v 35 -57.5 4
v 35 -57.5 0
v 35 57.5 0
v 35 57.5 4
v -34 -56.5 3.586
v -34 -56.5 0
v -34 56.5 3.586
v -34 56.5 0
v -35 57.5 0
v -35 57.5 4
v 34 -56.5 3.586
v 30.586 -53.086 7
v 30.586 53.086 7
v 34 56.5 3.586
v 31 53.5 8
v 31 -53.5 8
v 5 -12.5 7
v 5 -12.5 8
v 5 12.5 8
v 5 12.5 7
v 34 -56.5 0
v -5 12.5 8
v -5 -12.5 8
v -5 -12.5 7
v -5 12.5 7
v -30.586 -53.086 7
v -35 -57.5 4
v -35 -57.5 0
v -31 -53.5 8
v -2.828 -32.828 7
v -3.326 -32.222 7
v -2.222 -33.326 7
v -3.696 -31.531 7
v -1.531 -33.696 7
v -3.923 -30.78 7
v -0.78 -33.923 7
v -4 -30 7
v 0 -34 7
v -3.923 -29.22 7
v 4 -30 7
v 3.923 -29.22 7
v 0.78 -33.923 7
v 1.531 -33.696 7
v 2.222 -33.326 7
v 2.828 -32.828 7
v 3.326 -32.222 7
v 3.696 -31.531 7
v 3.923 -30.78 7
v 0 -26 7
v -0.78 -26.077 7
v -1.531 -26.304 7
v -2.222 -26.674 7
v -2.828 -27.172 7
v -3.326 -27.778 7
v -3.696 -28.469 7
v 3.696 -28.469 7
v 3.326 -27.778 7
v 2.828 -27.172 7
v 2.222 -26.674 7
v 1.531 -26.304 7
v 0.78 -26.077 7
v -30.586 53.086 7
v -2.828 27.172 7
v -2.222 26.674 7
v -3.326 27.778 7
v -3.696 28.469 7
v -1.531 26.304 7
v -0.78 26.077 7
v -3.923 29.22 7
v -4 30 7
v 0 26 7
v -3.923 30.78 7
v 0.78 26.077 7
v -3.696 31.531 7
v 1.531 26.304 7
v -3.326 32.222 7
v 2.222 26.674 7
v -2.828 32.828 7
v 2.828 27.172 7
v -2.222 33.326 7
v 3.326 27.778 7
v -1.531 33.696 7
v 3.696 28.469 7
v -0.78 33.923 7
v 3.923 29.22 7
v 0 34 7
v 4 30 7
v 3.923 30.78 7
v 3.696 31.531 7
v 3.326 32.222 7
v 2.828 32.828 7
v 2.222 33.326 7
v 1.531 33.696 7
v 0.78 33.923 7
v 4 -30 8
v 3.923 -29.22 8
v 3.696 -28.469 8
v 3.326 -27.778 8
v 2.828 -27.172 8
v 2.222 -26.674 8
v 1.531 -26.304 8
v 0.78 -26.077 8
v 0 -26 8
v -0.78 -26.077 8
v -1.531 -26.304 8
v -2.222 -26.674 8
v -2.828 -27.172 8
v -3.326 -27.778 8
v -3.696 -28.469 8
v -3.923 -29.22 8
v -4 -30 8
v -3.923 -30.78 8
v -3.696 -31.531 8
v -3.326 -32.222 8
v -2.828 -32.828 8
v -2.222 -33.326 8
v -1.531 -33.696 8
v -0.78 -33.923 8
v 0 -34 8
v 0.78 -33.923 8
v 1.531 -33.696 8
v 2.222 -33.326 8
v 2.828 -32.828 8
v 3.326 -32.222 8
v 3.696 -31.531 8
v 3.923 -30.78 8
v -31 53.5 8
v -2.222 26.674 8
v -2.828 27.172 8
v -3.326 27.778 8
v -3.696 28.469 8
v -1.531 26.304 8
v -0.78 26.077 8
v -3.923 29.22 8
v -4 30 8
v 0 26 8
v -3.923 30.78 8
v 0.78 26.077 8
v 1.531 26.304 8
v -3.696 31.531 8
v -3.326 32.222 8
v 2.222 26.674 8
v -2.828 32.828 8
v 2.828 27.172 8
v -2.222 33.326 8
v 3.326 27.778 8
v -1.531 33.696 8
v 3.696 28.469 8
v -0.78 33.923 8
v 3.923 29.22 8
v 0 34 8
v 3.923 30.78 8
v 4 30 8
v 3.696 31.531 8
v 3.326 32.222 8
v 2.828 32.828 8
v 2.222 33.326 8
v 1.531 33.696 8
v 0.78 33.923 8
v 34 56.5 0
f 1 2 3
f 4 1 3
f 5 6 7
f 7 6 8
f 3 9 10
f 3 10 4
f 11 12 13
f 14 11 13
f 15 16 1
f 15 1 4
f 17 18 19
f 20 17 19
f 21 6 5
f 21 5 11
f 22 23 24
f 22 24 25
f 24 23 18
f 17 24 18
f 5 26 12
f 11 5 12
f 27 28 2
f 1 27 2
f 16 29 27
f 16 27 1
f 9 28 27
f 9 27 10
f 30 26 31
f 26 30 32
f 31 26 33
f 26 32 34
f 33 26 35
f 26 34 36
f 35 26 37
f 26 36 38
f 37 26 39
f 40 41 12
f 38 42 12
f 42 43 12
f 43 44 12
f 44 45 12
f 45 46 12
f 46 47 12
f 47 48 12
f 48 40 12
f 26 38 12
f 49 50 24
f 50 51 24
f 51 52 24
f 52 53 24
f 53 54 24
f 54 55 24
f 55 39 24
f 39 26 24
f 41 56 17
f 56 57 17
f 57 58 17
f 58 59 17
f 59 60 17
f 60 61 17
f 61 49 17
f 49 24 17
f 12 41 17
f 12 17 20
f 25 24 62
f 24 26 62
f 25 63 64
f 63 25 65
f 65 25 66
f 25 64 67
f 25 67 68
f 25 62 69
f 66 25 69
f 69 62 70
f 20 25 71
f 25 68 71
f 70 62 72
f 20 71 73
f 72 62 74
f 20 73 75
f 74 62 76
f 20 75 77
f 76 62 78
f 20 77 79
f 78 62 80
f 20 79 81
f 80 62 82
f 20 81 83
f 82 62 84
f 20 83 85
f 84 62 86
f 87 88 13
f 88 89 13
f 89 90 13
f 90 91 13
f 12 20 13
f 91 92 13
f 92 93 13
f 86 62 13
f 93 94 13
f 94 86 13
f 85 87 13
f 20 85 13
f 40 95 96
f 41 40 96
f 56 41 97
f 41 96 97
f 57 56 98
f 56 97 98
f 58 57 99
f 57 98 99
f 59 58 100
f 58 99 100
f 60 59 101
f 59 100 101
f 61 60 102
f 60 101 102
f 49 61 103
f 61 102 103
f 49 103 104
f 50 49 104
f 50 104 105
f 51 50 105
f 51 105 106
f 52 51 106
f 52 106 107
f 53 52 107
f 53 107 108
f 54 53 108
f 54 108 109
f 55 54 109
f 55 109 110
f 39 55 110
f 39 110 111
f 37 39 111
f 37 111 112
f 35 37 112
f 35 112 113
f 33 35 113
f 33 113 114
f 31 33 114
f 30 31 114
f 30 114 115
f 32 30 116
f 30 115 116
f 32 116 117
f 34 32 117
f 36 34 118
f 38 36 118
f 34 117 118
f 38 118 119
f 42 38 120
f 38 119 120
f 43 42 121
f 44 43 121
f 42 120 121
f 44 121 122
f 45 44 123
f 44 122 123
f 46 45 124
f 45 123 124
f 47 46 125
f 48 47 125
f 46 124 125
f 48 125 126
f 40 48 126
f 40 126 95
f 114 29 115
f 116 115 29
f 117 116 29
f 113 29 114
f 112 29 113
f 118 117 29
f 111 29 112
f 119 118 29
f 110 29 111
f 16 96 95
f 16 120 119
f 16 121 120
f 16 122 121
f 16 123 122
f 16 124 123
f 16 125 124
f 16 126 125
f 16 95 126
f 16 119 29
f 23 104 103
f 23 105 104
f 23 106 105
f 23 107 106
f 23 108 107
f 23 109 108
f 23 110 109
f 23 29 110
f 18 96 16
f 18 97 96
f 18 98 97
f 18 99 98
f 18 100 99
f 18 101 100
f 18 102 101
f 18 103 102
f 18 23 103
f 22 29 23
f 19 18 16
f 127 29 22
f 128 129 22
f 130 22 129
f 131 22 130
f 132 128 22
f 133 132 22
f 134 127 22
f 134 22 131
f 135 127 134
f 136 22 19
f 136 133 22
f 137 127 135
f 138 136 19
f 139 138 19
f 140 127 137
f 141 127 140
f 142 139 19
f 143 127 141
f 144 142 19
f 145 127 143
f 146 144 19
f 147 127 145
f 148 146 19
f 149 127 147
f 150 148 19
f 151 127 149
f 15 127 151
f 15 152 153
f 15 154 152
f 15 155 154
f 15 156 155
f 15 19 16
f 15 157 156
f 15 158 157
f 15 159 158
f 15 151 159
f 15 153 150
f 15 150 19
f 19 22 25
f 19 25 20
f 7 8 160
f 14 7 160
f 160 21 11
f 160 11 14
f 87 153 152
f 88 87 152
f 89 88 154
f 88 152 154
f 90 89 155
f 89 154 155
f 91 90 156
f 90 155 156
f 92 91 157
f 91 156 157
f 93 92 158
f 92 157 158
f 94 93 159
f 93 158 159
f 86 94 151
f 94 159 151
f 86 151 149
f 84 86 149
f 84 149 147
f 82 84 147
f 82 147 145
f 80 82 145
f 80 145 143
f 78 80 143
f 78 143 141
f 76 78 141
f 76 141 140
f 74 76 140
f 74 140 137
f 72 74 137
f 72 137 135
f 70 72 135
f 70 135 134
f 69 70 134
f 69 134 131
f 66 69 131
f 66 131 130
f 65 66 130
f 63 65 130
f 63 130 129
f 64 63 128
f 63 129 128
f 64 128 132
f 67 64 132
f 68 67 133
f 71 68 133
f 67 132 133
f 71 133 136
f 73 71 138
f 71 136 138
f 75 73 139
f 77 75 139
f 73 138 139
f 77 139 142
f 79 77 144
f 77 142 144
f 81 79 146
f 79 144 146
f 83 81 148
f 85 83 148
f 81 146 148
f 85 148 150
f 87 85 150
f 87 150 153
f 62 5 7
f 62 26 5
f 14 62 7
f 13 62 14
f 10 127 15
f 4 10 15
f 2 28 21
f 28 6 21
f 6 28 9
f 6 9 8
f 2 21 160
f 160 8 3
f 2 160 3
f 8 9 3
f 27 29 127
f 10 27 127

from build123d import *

# Parameters (mm, degrees)
CROQUIS1_W              = 70
CROQUIS1_H              = 115
SALIENTE_EXTRUIR1_DEPTH = 8
CHAFL_N1_SIZE           = 4
VACIADO1_T              = -1
CROQUIS2_R              = 4
CROQUIS2_W              = 10
CROQUIS2_H              = 25
CORTAR_EXTRUIR1_DEPTH   = 68.788273322


with BuildPart() as part:
    # Croquis1 → Saliente-Extruir1 (new body)
    with BuildSketch(Plane.XY):
        Rectangle(CROQUIS1_W, CROQUIS1_H)
    extrude(amount=SALIENTE_EXTRUIR1_DEPTH)

    # Chaflán1
    chafl_n1_edges = [part.edges().sort_by_distance(p)[0] for p in [
        (-35, 0, 8),
        (0, -57.5, 8),
        (35, 0, 8),
        (0, 57.5, 8),
    ]]
    chamfer(chafl_n1_edges, length=CHAFL_N1_SIZE)

    # Vaciado1
    vaciado1_openings = [part.faces().sort_by_distance(p)[0] for p in [
        (0, 0, 0),
    ]]
    offset(amount=VACIADO1_T, openings=vaciado1_openings, kind=Kind.INTERSECTION)

    # Croquis2 → Cortar-Extruir1 (cut, through all)
    with BuildSketch(Plane.XY.offset(8)):
        with Locations((0, 30)):
            Circle(CROQUIS2_R)
        with Locations((0, -30)):
            Circle(CROQUIS2_R)
        Rectangle(CROQUIS2_W, CROQUIS2_H)
    extrude(amount=-CORTAR_EXTRUIR1_DEPTH, mode=Mode.SUBTRACT)


solid = part.part
